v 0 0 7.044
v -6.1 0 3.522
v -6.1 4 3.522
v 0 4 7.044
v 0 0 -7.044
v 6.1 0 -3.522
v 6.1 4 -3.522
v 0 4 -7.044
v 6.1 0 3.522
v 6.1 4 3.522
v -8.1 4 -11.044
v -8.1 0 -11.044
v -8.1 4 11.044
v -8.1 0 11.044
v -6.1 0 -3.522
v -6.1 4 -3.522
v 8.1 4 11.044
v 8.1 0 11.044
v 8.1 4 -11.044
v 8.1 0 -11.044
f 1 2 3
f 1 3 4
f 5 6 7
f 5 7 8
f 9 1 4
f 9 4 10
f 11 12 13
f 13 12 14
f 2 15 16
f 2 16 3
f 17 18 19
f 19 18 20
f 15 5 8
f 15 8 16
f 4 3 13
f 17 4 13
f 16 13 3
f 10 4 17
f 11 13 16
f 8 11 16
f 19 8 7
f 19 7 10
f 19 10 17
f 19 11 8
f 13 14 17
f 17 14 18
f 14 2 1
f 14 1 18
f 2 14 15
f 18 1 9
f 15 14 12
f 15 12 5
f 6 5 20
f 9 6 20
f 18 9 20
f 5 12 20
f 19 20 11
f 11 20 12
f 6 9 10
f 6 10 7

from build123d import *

# Parameters (mm, degrees)
EXTRUDE_1_DEPTH = 4


with BuildPart() as part:
    # 草图1 → 凸台-拉伸1 (new body)
    with BuildSketch(Plane(origin=(0, 0, 0), x_dir=(1, 0, 0), z_dir=(0, 1, 0))):
        Polygon((-8.1, 4.67653718), (-8.1, -4.67653718), (-8.1, -11.043673284), (8.1, -11.043673284), (8.1, -4.67653718), (8.1, 4.67653718), (8.1, 11.043673284), (-8.1, 11.043673284), align=None)
        Polygon((0, 7.043673284), (-6.1, 3.521836642), (-6.1, -3.521836642), (0, -7.043673284), (6.1, -3.521836642), (6.1, 3.521836642), align=None, mode=Mode.SUBTRACT)
    extrude(amount=EXTRUDE_1_DEPTH)


solid = part.part
